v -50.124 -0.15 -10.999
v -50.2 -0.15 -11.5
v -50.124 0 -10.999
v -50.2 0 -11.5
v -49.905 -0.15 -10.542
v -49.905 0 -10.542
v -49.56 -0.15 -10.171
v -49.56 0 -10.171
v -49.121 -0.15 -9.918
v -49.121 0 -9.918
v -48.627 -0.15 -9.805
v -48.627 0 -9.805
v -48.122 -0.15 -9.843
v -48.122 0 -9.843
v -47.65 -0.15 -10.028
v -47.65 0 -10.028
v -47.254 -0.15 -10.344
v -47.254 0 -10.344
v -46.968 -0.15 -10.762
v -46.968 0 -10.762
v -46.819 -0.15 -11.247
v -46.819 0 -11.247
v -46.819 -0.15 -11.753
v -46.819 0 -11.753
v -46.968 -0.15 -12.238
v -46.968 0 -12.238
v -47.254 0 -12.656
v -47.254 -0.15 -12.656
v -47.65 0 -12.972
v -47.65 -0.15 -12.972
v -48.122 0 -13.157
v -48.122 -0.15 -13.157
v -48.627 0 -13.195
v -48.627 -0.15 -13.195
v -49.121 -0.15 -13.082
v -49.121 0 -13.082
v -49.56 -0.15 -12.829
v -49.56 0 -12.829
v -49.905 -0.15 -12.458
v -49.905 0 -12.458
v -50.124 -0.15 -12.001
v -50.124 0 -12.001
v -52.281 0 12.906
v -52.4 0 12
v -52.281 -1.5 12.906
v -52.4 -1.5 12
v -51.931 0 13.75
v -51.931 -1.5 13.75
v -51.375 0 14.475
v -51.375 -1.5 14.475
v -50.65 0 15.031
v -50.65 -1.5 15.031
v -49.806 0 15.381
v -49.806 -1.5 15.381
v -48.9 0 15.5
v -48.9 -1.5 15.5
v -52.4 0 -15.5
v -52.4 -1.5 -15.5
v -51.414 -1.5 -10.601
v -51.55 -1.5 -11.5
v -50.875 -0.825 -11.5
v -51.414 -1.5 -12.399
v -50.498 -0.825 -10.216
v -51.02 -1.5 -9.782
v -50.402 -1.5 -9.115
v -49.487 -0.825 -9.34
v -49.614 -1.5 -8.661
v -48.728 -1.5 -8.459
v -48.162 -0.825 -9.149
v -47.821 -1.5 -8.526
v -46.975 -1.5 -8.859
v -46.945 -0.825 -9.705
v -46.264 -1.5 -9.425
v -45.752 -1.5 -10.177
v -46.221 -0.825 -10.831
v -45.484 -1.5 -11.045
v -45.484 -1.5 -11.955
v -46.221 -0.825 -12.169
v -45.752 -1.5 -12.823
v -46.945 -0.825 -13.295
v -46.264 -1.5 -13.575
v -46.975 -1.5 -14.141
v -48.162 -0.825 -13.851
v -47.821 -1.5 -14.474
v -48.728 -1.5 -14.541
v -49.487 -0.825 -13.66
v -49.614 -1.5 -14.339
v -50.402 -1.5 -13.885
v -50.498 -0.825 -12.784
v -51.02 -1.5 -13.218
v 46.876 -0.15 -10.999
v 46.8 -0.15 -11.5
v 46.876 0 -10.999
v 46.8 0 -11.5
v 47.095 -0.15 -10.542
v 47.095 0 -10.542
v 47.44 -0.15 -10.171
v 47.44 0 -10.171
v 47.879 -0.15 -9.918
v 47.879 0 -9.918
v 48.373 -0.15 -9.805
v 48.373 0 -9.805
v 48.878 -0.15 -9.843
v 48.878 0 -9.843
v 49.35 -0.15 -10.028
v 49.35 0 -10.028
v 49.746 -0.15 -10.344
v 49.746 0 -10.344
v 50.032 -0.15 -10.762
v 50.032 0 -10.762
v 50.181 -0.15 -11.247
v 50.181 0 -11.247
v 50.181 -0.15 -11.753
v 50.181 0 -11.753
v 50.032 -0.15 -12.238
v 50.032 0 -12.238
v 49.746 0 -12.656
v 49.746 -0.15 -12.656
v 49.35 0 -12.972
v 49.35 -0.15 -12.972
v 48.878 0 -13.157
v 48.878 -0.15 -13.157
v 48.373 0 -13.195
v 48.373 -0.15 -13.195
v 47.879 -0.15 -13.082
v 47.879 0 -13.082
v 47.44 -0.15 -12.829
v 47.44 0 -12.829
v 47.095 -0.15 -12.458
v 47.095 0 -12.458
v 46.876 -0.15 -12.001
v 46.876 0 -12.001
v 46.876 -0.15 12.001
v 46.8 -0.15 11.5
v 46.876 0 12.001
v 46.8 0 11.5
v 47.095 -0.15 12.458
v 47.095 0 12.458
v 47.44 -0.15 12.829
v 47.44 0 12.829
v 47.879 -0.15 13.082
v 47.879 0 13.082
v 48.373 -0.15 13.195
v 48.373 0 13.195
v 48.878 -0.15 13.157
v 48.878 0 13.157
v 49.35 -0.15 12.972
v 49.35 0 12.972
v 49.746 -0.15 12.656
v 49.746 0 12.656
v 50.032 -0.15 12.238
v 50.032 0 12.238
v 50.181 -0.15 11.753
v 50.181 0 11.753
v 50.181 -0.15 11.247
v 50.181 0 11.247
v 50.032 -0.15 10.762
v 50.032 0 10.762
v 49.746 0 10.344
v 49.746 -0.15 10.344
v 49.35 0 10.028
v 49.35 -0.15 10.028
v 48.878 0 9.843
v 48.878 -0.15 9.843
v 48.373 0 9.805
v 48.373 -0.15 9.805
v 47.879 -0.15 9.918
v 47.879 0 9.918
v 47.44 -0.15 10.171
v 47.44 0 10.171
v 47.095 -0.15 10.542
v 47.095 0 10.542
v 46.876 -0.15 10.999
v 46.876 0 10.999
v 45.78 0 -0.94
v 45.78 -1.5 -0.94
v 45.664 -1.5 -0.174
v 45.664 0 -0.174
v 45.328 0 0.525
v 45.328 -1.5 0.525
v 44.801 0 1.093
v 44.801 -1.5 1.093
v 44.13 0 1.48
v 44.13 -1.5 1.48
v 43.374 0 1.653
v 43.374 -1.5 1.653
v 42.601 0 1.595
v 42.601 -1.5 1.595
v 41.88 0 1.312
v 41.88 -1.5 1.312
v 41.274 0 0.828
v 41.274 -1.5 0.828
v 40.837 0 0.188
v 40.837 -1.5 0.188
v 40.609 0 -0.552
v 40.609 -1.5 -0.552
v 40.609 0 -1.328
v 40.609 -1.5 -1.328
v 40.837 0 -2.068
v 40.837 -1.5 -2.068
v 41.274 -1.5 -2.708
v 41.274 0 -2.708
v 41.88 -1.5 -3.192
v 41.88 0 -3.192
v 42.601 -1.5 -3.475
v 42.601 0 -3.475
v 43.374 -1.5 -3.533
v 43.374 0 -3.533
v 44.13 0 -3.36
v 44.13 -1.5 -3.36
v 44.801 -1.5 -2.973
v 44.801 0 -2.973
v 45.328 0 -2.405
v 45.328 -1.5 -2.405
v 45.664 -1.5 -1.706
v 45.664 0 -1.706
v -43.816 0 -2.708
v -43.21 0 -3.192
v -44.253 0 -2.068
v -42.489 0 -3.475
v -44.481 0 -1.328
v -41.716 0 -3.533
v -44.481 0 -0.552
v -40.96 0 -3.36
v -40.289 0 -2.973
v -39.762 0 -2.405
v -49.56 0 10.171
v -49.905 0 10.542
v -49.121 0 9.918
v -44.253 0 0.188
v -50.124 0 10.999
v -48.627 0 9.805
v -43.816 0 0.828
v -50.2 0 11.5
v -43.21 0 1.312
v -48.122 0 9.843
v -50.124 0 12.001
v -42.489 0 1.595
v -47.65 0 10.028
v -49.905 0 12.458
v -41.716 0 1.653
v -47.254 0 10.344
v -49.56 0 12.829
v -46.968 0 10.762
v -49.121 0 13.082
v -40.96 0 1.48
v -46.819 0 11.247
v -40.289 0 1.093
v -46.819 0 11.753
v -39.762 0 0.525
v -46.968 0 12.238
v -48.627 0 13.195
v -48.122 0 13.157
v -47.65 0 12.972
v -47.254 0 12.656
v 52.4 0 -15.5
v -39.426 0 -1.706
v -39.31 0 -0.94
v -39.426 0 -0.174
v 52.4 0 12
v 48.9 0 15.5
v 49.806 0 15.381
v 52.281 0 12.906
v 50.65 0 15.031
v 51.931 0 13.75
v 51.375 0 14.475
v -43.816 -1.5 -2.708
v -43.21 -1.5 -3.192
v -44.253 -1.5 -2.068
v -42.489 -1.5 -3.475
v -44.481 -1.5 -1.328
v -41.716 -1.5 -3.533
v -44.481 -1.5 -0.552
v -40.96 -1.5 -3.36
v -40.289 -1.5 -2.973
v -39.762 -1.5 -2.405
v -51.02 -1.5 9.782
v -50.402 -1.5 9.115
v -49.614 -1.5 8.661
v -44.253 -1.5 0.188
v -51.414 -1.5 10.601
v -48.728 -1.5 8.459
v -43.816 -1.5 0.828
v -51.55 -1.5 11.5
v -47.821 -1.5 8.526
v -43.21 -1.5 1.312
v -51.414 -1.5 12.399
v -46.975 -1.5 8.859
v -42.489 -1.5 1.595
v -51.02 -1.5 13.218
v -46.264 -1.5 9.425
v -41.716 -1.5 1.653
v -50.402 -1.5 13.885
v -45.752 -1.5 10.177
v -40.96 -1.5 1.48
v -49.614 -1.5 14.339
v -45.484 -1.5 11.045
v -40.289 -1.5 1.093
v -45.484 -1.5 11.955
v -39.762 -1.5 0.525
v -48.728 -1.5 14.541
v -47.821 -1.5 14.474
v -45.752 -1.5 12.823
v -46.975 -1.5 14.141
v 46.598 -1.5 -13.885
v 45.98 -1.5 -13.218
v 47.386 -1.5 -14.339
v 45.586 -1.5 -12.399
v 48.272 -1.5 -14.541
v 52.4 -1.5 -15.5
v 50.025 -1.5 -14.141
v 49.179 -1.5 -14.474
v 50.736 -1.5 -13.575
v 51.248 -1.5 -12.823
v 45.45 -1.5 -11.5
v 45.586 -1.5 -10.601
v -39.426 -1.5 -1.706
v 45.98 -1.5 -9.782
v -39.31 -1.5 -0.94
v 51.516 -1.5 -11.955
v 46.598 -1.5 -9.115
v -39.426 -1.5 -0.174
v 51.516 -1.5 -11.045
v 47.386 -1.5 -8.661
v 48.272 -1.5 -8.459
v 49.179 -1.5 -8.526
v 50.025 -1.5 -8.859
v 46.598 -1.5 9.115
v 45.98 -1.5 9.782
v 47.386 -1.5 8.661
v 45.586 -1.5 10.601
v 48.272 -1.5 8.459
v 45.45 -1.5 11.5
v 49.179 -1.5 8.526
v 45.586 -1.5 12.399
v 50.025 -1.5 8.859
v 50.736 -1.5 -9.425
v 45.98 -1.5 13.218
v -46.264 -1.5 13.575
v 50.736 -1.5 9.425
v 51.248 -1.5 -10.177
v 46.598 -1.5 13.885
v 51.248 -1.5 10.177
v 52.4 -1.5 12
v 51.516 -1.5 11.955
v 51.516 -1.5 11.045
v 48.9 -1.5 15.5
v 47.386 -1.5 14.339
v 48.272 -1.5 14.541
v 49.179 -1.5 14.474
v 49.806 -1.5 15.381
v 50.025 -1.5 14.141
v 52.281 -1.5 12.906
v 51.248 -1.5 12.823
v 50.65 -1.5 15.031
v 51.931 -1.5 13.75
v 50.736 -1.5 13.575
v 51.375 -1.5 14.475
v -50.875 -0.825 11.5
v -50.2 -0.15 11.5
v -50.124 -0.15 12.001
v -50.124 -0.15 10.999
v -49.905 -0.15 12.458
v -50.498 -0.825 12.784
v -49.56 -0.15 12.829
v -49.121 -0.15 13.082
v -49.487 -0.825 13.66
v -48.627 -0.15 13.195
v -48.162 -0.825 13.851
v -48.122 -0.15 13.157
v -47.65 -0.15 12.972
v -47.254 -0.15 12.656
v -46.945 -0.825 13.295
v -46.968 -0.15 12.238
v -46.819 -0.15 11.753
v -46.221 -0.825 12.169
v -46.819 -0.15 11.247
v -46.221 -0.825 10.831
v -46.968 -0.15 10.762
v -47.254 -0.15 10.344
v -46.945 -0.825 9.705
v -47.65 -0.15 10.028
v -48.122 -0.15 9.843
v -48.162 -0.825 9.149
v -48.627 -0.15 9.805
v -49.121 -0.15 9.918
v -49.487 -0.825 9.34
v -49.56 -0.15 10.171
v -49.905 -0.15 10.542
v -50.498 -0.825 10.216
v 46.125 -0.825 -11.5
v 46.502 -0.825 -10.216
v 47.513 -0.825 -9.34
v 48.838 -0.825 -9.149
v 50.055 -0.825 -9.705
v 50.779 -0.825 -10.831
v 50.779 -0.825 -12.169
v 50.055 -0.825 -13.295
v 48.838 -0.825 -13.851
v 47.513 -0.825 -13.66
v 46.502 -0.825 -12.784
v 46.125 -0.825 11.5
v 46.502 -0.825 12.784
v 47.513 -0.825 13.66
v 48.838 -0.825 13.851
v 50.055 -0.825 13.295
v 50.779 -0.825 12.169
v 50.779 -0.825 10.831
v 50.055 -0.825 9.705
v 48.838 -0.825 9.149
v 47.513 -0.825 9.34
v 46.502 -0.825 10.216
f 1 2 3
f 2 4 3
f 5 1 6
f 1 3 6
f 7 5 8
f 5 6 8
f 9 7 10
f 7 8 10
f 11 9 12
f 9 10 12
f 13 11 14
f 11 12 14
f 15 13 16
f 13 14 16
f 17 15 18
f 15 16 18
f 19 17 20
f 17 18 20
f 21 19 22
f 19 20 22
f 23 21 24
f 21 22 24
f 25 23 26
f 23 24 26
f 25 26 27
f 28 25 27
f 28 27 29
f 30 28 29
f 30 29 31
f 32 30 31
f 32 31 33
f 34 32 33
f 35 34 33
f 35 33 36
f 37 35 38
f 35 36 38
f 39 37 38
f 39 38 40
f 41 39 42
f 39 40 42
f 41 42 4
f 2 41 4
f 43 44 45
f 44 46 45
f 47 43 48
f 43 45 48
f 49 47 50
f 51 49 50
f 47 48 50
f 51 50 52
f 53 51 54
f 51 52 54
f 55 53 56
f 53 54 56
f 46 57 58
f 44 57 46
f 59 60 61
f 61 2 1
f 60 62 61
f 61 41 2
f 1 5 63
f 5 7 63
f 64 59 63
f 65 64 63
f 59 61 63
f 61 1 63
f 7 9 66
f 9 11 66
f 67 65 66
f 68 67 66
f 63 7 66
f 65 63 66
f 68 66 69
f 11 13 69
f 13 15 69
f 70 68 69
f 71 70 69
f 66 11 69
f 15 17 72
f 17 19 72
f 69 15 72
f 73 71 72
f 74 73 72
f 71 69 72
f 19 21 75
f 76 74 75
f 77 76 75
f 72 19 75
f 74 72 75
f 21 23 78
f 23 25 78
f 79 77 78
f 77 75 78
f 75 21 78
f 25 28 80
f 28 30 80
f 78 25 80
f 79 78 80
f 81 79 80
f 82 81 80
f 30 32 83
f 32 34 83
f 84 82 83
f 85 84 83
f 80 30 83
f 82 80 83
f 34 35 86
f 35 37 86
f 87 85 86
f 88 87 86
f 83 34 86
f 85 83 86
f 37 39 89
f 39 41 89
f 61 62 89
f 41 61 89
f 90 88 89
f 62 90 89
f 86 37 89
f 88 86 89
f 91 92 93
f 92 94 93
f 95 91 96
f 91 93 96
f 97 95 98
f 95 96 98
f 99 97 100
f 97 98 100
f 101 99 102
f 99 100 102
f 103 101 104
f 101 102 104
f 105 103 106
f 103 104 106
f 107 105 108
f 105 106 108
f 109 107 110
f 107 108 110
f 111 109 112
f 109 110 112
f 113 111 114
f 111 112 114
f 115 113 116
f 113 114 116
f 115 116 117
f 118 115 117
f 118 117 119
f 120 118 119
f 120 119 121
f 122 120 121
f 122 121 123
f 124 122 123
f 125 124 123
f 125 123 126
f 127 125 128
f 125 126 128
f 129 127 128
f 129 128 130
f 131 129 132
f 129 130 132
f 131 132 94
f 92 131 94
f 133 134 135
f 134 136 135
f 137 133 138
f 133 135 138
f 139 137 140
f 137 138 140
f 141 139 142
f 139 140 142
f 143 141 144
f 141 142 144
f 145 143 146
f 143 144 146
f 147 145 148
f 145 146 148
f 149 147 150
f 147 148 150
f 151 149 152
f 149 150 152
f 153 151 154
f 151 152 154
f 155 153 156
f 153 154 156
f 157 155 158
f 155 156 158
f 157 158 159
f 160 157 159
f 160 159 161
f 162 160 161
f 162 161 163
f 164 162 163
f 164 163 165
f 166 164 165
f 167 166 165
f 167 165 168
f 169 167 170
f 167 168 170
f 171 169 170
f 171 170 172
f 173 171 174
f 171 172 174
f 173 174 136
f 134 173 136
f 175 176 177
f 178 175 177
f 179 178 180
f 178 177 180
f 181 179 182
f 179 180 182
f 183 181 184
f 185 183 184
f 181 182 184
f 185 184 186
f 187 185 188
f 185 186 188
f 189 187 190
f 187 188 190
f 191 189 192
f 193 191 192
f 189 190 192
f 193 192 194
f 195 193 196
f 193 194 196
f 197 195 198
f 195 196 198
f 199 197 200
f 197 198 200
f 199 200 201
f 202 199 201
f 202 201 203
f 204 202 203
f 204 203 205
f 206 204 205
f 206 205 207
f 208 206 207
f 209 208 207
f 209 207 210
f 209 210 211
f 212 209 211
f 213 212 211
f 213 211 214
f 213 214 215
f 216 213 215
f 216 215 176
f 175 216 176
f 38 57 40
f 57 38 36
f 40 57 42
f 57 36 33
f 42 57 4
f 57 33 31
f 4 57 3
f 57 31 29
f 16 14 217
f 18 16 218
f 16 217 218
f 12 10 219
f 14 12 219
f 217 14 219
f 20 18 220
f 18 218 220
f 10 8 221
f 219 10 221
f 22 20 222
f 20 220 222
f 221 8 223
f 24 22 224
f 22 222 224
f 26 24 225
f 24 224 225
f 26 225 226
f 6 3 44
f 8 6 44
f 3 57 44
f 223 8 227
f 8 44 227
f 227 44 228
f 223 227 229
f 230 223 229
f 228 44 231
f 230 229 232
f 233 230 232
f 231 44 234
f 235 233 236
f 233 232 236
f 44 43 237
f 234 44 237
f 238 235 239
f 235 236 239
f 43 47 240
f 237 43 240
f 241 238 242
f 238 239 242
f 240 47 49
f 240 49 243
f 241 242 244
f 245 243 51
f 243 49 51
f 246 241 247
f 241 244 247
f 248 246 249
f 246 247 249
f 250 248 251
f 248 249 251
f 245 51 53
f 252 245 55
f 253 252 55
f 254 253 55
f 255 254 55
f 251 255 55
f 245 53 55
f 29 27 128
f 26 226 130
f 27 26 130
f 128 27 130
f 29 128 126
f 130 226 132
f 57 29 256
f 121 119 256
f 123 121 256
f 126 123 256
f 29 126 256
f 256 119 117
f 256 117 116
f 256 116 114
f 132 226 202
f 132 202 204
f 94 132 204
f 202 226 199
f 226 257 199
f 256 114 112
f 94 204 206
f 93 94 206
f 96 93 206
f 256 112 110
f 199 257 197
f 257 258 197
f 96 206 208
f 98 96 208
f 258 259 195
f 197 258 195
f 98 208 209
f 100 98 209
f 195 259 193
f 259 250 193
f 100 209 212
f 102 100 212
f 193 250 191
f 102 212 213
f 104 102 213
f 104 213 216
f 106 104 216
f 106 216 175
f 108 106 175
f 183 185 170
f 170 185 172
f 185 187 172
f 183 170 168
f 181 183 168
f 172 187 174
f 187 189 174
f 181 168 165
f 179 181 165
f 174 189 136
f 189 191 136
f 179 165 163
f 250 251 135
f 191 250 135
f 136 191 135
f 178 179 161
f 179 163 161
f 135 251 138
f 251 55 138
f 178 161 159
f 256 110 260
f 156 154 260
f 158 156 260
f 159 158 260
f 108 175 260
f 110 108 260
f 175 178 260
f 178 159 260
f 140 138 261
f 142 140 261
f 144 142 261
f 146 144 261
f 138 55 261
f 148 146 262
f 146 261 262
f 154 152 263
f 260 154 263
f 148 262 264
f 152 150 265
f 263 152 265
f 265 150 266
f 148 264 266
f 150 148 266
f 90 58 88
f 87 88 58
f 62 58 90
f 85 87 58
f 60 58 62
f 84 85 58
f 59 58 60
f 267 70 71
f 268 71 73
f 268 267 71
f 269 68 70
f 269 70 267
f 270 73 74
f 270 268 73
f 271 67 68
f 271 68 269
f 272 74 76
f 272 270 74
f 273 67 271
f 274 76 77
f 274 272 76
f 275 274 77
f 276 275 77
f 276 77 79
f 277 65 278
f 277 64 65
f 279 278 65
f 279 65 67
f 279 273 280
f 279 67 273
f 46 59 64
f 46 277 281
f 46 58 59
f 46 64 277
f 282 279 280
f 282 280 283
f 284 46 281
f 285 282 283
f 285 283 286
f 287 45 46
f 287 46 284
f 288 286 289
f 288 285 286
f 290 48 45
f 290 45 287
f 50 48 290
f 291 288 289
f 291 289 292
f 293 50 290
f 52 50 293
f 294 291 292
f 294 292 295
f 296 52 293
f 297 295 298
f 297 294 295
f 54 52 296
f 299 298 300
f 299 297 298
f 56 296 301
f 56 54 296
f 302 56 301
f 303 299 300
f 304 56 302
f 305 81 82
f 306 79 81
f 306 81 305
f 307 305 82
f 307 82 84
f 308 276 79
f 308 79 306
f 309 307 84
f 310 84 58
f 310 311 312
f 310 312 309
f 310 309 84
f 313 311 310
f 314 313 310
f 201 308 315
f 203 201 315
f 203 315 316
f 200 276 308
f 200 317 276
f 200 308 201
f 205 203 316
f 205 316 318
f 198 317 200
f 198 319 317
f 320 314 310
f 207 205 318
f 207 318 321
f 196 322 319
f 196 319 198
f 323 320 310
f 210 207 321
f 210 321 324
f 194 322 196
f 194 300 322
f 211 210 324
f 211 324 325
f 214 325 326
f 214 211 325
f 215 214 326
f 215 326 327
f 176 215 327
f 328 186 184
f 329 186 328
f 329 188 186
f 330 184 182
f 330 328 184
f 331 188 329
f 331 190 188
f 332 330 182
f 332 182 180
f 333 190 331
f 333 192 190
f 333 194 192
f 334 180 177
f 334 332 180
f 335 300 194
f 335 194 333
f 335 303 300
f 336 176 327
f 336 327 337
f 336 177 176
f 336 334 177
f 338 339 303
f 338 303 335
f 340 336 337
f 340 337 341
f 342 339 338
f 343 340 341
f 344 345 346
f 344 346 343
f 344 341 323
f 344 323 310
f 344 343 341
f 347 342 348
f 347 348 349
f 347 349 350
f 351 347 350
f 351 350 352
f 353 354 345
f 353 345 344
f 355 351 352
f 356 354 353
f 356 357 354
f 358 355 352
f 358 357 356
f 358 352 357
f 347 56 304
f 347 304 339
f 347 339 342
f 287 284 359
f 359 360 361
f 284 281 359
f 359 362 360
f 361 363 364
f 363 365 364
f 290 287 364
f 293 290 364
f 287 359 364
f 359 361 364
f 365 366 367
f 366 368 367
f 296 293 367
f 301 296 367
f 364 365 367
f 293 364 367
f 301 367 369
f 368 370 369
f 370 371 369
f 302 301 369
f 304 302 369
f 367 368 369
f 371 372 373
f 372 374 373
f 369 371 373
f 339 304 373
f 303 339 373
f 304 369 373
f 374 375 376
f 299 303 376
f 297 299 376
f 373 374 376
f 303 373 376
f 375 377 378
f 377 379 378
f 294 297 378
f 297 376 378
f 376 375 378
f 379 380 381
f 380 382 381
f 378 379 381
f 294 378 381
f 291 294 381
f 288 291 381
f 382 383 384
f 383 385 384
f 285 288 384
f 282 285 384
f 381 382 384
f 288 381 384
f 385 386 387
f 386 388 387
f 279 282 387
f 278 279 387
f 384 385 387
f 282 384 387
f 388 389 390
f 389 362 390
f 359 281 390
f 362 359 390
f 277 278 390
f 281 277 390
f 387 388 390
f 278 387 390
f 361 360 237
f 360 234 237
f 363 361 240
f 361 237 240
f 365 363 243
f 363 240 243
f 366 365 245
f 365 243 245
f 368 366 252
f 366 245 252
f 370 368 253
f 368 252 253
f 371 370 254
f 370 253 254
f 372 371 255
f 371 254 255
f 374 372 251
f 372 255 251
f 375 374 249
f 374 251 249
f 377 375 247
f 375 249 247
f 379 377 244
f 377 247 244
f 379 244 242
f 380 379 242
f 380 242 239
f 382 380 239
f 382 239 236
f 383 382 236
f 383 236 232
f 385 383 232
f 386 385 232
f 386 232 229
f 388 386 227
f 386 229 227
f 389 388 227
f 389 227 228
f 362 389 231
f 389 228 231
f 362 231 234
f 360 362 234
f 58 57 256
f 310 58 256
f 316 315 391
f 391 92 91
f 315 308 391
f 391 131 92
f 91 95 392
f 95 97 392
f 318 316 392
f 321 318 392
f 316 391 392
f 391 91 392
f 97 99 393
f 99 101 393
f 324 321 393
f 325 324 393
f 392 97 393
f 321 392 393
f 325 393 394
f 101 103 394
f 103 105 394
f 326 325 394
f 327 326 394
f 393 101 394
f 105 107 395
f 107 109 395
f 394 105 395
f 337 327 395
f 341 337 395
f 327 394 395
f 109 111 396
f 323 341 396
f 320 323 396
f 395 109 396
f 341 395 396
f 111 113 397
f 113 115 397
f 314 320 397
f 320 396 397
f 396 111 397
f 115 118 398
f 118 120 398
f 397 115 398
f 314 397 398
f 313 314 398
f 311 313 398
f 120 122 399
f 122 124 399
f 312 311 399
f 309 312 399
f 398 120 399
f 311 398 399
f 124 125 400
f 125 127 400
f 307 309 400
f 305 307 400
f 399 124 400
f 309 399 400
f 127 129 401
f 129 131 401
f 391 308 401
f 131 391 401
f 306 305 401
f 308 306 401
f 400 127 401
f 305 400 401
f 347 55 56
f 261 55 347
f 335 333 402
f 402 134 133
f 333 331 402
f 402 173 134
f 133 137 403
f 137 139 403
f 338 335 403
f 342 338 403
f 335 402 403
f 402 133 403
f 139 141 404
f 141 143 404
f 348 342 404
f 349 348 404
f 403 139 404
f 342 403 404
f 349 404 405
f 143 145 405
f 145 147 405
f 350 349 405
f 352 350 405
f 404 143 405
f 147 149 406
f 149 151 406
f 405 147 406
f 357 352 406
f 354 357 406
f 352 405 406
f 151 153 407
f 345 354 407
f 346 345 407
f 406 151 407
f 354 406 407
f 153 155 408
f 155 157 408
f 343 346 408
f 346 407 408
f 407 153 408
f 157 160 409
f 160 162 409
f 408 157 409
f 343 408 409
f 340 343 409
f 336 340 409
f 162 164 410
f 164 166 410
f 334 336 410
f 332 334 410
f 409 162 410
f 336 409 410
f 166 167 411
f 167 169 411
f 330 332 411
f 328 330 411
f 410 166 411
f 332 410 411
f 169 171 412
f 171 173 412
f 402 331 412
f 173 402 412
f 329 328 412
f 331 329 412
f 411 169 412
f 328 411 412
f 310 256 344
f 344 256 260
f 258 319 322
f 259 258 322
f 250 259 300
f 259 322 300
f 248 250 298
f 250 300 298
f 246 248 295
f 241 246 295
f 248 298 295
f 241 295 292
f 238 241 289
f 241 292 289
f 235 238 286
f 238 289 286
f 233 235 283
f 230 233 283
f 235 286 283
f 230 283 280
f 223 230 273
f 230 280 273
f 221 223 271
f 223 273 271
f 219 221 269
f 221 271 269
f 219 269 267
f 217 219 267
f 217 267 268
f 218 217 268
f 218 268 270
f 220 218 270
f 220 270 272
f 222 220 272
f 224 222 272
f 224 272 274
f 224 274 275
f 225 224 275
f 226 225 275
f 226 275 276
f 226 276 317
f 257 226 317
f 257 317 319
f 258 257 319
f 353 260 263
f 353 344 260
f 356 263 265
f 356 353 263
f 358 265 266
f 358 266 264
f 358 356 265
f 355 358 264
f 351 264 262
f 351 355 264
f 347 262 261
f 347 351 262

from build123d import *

# Parameters (mm, degrees)
SKETCH_W            = 104.8
SKETCH_H            = 31
PAD_DEPTH           = 1.5
HOLE_D              = 3.4
HOLE_DEPTH          = 25
HOLE_CSINK_D        = 6.1
HOLE_CSINK_ANGLE    = 90
FILLET_R            = 3.5
SKETCH002_R         = 2.6
POCKET_DEPTH        = 1.501
LINEARPATTERN_COUNT = 2
LINEARPATTERN_PITCH = 85.09


with BuildPart() as part:
    # Sketch → Pad (new body)
    with BuildSketch(Plane.XZ):
        Rectangle(SKETCH_W, SKETCH_H)
    extrude(amount=PAD_DEPTH)

    # Hole
    with Locations(Plane.XZ.offset(1.5)):
        with Locations((-48.5, 11.5), (-48.5, -11.5), (48.5, -11.5), (48.5, 11.5)):
            CounterSinkHole(HOLE_D / 2, HOLE_CSINK_D / 2, depth=HOLE_DEPTH, counter_sink_angle=HOLE_CSINK_ANGLE)

    # Fillet
    fillet_edges = [part.edges().sort_by_distance(p)[0] for p in [
        (-52.4, -0.75, 15.5),
        (52.4, -0.75, 15.5),
    ]]
    fillet(fillet_edges, radius=FILLET_R)

    # Sketch002 (on Face5 of Fillet) → Pocket (cut, through all)
    with BuildSketch(Plane.XZ.offset(1.5)):
        with Locations((-41.91, -0.94)):
            Circle(SKETCH002_R)
    pocket = extrude(amount=-POCKET_DEPTH, mode=Mode.SUBTRACT)

    # LinearPattern: Pocket ×2
    with Locations(*[(i * LINEARPATTERN_PITCH, 0, 0) for i in range(1, LINEARPATTERN_COUNT)]):
        add(pocket, mode=Mode.SUBTRACT)


solid = part.part
